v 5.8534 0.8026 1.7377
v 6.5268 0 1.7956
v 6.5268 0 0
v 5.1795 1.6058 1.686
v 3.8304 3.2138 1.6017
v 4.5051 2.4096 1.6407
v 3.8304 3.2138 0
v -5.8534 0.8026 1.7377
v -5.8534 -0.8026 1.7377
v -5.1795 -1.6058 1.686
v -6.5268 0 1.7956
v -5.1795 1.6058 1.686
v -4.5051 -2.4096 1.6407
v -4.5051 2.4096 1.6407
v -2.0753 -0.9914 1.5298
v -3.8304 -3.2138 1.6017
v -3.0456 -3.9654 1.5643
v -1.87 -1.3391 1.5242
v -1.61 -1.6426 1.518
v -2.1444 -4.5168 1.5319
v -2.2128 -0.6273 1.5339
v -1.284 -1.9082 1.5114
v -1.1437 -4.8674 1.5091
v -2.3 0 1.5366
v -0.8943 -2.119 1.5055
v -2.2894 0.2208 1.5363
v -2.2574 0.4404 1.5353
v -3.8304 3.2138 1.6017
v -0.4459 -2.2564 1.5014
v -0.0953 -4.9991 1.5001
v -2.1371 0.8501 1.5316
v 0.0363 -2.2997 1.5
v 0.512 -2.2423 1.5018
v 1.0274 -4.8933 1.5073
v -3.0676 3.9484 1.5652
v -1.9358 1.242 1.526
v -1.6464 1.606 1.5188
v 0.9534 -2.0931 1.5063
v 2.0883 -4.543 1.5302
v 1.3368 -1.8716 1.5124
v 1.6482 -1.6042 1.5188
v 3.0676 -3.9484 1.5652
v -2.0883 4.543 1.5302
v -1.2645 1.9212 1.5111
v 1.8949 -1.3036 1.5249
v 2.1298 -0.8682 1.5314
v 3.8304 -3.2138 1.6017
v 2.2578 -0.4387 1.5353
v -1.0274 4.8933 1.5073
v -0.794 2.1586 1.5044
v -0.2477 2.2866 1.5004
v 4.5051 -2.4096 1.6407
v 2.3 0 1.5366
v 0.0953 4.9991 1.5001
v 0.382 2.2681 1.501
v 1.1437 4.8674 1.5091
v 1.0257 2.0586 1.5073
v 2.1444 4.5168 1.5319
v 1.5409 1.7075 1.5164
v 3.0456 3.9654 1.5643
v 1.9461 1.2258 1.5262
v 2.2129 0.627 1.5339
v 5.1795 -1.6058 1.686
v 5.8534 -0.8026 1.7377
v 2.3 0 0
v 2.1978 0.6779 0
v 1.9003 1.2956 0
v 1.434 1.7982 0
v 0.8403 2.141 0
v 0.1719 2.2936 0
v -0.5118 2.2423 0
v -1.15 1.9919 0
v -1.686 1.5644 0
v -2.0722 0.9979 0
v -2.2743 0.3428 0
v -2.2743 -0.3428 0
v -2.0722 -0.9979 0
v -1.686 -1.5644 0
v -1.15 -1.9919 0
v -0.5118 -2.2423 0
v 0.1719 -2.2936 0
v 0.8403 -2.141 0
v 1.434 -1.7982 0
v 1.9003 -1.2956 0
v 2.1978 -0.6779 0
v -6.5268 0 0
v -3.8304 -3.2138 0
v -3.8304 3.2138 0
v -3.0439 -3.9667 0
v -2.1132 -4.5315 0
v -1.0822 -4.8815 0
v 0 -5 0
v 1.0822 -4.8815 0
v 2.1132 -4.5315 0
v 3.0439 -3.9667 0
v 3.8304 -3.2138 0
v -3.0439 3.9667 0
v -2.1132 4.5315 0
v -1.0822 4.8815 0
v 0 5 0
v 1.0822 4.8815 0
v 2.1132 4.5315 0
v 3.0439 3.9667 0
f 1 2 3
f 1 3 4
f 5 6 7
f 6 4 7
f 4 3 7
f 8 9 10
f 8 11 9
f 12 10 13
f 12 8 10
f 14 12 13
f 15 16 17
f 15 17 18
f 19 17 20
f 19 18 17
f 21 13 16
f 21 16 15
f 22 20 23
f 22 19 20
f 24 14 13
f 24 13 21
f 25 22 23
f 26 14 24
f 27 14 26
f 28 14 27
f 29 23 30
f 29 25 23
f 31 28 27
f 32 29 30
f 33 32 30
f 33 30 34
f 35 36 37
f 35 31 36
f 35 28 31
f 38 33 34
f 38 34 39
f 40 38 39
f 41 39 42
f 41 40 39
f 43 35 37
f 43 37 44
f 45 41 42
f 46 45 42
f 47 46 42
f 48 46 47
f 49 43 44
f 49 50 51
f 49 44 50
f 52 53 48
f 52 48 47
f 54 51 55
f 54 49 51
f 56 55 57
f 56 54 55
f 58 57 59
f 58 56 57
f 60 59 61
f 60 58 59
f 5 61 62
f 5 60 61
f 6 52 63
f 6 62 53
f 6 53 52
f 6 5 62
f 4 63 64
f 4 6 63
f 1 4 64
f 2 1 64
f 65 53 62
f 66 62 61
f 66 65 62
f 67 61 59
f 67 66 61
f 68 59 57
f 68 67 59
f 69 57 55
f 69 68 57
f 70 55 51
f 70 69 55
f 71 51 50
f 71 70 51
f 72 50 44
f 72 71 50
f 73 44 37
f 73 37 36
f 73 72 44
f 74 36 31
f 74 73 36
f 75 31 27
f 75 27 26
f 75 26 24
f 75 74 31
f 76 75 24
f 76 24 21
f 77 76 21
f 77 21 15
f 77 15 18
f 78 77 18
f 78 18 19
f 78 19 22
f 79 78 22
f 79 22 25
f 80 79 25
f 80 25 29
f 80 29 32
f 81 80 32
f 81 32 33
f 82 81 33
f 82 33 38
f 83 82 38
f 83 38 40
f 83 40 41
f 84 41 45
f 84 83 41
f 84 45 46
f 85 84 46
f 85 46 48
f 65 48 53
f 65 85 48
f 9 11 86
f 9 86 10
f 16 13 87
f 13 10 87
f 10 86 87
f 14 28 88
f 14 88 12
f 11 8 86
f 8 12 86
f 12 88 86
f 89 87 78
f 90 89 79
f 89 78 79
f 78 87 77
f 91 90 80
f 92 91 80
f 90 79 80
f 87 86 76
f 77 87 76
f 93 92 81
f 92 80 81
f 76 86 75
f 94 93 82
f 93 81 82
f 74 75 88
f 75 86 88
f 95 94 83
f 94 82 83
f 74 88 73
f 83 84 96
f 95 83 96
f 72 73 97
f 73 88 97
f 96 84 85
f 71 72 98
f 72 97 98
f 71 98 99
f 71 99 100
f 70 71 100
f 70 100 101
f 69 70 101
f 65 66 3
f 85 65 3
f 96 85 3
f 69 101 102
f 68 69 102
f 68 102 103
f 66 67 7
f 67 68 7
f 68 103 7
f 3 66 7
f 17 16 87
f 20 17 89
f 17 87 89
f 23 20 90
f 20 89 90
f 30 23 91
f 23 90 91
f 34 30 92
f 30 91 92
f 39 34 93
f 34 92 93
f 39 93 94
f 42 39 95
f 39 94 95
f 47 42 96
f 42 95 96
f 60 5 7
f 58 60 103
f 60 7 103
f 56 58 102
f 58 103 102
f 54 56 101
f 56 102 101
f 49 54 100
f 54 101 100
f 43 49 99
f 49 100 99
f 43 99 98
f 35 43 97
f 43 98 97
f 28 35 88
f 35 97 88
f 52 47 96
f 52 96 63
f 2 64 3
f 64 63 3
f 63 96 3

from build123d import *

# Parameters (mm, degrees)
F0_R          = 2.3
F1_DEPTH      = 3
F2_R          = 72.2
F3_DEPTH      = 25
F3_DEPTH_BACK = 25


with BuildPart() as f1:
    # F0 (on Top) → F1 (new body)
    with BuildSketch(Plane.XY):
        with BuildLine():
            Line((-6.5268066341, 0), (-3.8303570799, -3.2137773166))
            ThreePointArc((-3.8303570799, -3.2137773166), (0, -5), (3.8303570799, -3.2137773166))
            Line((3.8303570799, -3.2137773166), (6.5268066341, 0))
            Line((6.5268066341, 0), (3.8303570799, 3.2137773166))
            ThreePointArc((3.8303570799, 3.2137773166), (0, 5), (-3.8303570799, 3.2137773166))
            Line((-3.8303570799, 3.2137773166), (-6.5268066341, 0))
        make_face()
        Circle(F0_R, mode=Mode.SUBTRACT)
    extrude(amount=F1_DEPTH)

    # F2 (on Front) → F3 (cut, two sides)
    with BuildSketch(Plane.XZ) as f3_sk:
        with Locations((0, 73.7)):
            Circle(F2_R)
    extrude(amount=-F3_DEPTH, mode=Mode.SUBTRACT)
    extrude(f3_sk.sketch, amount=F3_DEPTH_BACK, mode=Mode.SUBTRACT)


solid = f1.part
